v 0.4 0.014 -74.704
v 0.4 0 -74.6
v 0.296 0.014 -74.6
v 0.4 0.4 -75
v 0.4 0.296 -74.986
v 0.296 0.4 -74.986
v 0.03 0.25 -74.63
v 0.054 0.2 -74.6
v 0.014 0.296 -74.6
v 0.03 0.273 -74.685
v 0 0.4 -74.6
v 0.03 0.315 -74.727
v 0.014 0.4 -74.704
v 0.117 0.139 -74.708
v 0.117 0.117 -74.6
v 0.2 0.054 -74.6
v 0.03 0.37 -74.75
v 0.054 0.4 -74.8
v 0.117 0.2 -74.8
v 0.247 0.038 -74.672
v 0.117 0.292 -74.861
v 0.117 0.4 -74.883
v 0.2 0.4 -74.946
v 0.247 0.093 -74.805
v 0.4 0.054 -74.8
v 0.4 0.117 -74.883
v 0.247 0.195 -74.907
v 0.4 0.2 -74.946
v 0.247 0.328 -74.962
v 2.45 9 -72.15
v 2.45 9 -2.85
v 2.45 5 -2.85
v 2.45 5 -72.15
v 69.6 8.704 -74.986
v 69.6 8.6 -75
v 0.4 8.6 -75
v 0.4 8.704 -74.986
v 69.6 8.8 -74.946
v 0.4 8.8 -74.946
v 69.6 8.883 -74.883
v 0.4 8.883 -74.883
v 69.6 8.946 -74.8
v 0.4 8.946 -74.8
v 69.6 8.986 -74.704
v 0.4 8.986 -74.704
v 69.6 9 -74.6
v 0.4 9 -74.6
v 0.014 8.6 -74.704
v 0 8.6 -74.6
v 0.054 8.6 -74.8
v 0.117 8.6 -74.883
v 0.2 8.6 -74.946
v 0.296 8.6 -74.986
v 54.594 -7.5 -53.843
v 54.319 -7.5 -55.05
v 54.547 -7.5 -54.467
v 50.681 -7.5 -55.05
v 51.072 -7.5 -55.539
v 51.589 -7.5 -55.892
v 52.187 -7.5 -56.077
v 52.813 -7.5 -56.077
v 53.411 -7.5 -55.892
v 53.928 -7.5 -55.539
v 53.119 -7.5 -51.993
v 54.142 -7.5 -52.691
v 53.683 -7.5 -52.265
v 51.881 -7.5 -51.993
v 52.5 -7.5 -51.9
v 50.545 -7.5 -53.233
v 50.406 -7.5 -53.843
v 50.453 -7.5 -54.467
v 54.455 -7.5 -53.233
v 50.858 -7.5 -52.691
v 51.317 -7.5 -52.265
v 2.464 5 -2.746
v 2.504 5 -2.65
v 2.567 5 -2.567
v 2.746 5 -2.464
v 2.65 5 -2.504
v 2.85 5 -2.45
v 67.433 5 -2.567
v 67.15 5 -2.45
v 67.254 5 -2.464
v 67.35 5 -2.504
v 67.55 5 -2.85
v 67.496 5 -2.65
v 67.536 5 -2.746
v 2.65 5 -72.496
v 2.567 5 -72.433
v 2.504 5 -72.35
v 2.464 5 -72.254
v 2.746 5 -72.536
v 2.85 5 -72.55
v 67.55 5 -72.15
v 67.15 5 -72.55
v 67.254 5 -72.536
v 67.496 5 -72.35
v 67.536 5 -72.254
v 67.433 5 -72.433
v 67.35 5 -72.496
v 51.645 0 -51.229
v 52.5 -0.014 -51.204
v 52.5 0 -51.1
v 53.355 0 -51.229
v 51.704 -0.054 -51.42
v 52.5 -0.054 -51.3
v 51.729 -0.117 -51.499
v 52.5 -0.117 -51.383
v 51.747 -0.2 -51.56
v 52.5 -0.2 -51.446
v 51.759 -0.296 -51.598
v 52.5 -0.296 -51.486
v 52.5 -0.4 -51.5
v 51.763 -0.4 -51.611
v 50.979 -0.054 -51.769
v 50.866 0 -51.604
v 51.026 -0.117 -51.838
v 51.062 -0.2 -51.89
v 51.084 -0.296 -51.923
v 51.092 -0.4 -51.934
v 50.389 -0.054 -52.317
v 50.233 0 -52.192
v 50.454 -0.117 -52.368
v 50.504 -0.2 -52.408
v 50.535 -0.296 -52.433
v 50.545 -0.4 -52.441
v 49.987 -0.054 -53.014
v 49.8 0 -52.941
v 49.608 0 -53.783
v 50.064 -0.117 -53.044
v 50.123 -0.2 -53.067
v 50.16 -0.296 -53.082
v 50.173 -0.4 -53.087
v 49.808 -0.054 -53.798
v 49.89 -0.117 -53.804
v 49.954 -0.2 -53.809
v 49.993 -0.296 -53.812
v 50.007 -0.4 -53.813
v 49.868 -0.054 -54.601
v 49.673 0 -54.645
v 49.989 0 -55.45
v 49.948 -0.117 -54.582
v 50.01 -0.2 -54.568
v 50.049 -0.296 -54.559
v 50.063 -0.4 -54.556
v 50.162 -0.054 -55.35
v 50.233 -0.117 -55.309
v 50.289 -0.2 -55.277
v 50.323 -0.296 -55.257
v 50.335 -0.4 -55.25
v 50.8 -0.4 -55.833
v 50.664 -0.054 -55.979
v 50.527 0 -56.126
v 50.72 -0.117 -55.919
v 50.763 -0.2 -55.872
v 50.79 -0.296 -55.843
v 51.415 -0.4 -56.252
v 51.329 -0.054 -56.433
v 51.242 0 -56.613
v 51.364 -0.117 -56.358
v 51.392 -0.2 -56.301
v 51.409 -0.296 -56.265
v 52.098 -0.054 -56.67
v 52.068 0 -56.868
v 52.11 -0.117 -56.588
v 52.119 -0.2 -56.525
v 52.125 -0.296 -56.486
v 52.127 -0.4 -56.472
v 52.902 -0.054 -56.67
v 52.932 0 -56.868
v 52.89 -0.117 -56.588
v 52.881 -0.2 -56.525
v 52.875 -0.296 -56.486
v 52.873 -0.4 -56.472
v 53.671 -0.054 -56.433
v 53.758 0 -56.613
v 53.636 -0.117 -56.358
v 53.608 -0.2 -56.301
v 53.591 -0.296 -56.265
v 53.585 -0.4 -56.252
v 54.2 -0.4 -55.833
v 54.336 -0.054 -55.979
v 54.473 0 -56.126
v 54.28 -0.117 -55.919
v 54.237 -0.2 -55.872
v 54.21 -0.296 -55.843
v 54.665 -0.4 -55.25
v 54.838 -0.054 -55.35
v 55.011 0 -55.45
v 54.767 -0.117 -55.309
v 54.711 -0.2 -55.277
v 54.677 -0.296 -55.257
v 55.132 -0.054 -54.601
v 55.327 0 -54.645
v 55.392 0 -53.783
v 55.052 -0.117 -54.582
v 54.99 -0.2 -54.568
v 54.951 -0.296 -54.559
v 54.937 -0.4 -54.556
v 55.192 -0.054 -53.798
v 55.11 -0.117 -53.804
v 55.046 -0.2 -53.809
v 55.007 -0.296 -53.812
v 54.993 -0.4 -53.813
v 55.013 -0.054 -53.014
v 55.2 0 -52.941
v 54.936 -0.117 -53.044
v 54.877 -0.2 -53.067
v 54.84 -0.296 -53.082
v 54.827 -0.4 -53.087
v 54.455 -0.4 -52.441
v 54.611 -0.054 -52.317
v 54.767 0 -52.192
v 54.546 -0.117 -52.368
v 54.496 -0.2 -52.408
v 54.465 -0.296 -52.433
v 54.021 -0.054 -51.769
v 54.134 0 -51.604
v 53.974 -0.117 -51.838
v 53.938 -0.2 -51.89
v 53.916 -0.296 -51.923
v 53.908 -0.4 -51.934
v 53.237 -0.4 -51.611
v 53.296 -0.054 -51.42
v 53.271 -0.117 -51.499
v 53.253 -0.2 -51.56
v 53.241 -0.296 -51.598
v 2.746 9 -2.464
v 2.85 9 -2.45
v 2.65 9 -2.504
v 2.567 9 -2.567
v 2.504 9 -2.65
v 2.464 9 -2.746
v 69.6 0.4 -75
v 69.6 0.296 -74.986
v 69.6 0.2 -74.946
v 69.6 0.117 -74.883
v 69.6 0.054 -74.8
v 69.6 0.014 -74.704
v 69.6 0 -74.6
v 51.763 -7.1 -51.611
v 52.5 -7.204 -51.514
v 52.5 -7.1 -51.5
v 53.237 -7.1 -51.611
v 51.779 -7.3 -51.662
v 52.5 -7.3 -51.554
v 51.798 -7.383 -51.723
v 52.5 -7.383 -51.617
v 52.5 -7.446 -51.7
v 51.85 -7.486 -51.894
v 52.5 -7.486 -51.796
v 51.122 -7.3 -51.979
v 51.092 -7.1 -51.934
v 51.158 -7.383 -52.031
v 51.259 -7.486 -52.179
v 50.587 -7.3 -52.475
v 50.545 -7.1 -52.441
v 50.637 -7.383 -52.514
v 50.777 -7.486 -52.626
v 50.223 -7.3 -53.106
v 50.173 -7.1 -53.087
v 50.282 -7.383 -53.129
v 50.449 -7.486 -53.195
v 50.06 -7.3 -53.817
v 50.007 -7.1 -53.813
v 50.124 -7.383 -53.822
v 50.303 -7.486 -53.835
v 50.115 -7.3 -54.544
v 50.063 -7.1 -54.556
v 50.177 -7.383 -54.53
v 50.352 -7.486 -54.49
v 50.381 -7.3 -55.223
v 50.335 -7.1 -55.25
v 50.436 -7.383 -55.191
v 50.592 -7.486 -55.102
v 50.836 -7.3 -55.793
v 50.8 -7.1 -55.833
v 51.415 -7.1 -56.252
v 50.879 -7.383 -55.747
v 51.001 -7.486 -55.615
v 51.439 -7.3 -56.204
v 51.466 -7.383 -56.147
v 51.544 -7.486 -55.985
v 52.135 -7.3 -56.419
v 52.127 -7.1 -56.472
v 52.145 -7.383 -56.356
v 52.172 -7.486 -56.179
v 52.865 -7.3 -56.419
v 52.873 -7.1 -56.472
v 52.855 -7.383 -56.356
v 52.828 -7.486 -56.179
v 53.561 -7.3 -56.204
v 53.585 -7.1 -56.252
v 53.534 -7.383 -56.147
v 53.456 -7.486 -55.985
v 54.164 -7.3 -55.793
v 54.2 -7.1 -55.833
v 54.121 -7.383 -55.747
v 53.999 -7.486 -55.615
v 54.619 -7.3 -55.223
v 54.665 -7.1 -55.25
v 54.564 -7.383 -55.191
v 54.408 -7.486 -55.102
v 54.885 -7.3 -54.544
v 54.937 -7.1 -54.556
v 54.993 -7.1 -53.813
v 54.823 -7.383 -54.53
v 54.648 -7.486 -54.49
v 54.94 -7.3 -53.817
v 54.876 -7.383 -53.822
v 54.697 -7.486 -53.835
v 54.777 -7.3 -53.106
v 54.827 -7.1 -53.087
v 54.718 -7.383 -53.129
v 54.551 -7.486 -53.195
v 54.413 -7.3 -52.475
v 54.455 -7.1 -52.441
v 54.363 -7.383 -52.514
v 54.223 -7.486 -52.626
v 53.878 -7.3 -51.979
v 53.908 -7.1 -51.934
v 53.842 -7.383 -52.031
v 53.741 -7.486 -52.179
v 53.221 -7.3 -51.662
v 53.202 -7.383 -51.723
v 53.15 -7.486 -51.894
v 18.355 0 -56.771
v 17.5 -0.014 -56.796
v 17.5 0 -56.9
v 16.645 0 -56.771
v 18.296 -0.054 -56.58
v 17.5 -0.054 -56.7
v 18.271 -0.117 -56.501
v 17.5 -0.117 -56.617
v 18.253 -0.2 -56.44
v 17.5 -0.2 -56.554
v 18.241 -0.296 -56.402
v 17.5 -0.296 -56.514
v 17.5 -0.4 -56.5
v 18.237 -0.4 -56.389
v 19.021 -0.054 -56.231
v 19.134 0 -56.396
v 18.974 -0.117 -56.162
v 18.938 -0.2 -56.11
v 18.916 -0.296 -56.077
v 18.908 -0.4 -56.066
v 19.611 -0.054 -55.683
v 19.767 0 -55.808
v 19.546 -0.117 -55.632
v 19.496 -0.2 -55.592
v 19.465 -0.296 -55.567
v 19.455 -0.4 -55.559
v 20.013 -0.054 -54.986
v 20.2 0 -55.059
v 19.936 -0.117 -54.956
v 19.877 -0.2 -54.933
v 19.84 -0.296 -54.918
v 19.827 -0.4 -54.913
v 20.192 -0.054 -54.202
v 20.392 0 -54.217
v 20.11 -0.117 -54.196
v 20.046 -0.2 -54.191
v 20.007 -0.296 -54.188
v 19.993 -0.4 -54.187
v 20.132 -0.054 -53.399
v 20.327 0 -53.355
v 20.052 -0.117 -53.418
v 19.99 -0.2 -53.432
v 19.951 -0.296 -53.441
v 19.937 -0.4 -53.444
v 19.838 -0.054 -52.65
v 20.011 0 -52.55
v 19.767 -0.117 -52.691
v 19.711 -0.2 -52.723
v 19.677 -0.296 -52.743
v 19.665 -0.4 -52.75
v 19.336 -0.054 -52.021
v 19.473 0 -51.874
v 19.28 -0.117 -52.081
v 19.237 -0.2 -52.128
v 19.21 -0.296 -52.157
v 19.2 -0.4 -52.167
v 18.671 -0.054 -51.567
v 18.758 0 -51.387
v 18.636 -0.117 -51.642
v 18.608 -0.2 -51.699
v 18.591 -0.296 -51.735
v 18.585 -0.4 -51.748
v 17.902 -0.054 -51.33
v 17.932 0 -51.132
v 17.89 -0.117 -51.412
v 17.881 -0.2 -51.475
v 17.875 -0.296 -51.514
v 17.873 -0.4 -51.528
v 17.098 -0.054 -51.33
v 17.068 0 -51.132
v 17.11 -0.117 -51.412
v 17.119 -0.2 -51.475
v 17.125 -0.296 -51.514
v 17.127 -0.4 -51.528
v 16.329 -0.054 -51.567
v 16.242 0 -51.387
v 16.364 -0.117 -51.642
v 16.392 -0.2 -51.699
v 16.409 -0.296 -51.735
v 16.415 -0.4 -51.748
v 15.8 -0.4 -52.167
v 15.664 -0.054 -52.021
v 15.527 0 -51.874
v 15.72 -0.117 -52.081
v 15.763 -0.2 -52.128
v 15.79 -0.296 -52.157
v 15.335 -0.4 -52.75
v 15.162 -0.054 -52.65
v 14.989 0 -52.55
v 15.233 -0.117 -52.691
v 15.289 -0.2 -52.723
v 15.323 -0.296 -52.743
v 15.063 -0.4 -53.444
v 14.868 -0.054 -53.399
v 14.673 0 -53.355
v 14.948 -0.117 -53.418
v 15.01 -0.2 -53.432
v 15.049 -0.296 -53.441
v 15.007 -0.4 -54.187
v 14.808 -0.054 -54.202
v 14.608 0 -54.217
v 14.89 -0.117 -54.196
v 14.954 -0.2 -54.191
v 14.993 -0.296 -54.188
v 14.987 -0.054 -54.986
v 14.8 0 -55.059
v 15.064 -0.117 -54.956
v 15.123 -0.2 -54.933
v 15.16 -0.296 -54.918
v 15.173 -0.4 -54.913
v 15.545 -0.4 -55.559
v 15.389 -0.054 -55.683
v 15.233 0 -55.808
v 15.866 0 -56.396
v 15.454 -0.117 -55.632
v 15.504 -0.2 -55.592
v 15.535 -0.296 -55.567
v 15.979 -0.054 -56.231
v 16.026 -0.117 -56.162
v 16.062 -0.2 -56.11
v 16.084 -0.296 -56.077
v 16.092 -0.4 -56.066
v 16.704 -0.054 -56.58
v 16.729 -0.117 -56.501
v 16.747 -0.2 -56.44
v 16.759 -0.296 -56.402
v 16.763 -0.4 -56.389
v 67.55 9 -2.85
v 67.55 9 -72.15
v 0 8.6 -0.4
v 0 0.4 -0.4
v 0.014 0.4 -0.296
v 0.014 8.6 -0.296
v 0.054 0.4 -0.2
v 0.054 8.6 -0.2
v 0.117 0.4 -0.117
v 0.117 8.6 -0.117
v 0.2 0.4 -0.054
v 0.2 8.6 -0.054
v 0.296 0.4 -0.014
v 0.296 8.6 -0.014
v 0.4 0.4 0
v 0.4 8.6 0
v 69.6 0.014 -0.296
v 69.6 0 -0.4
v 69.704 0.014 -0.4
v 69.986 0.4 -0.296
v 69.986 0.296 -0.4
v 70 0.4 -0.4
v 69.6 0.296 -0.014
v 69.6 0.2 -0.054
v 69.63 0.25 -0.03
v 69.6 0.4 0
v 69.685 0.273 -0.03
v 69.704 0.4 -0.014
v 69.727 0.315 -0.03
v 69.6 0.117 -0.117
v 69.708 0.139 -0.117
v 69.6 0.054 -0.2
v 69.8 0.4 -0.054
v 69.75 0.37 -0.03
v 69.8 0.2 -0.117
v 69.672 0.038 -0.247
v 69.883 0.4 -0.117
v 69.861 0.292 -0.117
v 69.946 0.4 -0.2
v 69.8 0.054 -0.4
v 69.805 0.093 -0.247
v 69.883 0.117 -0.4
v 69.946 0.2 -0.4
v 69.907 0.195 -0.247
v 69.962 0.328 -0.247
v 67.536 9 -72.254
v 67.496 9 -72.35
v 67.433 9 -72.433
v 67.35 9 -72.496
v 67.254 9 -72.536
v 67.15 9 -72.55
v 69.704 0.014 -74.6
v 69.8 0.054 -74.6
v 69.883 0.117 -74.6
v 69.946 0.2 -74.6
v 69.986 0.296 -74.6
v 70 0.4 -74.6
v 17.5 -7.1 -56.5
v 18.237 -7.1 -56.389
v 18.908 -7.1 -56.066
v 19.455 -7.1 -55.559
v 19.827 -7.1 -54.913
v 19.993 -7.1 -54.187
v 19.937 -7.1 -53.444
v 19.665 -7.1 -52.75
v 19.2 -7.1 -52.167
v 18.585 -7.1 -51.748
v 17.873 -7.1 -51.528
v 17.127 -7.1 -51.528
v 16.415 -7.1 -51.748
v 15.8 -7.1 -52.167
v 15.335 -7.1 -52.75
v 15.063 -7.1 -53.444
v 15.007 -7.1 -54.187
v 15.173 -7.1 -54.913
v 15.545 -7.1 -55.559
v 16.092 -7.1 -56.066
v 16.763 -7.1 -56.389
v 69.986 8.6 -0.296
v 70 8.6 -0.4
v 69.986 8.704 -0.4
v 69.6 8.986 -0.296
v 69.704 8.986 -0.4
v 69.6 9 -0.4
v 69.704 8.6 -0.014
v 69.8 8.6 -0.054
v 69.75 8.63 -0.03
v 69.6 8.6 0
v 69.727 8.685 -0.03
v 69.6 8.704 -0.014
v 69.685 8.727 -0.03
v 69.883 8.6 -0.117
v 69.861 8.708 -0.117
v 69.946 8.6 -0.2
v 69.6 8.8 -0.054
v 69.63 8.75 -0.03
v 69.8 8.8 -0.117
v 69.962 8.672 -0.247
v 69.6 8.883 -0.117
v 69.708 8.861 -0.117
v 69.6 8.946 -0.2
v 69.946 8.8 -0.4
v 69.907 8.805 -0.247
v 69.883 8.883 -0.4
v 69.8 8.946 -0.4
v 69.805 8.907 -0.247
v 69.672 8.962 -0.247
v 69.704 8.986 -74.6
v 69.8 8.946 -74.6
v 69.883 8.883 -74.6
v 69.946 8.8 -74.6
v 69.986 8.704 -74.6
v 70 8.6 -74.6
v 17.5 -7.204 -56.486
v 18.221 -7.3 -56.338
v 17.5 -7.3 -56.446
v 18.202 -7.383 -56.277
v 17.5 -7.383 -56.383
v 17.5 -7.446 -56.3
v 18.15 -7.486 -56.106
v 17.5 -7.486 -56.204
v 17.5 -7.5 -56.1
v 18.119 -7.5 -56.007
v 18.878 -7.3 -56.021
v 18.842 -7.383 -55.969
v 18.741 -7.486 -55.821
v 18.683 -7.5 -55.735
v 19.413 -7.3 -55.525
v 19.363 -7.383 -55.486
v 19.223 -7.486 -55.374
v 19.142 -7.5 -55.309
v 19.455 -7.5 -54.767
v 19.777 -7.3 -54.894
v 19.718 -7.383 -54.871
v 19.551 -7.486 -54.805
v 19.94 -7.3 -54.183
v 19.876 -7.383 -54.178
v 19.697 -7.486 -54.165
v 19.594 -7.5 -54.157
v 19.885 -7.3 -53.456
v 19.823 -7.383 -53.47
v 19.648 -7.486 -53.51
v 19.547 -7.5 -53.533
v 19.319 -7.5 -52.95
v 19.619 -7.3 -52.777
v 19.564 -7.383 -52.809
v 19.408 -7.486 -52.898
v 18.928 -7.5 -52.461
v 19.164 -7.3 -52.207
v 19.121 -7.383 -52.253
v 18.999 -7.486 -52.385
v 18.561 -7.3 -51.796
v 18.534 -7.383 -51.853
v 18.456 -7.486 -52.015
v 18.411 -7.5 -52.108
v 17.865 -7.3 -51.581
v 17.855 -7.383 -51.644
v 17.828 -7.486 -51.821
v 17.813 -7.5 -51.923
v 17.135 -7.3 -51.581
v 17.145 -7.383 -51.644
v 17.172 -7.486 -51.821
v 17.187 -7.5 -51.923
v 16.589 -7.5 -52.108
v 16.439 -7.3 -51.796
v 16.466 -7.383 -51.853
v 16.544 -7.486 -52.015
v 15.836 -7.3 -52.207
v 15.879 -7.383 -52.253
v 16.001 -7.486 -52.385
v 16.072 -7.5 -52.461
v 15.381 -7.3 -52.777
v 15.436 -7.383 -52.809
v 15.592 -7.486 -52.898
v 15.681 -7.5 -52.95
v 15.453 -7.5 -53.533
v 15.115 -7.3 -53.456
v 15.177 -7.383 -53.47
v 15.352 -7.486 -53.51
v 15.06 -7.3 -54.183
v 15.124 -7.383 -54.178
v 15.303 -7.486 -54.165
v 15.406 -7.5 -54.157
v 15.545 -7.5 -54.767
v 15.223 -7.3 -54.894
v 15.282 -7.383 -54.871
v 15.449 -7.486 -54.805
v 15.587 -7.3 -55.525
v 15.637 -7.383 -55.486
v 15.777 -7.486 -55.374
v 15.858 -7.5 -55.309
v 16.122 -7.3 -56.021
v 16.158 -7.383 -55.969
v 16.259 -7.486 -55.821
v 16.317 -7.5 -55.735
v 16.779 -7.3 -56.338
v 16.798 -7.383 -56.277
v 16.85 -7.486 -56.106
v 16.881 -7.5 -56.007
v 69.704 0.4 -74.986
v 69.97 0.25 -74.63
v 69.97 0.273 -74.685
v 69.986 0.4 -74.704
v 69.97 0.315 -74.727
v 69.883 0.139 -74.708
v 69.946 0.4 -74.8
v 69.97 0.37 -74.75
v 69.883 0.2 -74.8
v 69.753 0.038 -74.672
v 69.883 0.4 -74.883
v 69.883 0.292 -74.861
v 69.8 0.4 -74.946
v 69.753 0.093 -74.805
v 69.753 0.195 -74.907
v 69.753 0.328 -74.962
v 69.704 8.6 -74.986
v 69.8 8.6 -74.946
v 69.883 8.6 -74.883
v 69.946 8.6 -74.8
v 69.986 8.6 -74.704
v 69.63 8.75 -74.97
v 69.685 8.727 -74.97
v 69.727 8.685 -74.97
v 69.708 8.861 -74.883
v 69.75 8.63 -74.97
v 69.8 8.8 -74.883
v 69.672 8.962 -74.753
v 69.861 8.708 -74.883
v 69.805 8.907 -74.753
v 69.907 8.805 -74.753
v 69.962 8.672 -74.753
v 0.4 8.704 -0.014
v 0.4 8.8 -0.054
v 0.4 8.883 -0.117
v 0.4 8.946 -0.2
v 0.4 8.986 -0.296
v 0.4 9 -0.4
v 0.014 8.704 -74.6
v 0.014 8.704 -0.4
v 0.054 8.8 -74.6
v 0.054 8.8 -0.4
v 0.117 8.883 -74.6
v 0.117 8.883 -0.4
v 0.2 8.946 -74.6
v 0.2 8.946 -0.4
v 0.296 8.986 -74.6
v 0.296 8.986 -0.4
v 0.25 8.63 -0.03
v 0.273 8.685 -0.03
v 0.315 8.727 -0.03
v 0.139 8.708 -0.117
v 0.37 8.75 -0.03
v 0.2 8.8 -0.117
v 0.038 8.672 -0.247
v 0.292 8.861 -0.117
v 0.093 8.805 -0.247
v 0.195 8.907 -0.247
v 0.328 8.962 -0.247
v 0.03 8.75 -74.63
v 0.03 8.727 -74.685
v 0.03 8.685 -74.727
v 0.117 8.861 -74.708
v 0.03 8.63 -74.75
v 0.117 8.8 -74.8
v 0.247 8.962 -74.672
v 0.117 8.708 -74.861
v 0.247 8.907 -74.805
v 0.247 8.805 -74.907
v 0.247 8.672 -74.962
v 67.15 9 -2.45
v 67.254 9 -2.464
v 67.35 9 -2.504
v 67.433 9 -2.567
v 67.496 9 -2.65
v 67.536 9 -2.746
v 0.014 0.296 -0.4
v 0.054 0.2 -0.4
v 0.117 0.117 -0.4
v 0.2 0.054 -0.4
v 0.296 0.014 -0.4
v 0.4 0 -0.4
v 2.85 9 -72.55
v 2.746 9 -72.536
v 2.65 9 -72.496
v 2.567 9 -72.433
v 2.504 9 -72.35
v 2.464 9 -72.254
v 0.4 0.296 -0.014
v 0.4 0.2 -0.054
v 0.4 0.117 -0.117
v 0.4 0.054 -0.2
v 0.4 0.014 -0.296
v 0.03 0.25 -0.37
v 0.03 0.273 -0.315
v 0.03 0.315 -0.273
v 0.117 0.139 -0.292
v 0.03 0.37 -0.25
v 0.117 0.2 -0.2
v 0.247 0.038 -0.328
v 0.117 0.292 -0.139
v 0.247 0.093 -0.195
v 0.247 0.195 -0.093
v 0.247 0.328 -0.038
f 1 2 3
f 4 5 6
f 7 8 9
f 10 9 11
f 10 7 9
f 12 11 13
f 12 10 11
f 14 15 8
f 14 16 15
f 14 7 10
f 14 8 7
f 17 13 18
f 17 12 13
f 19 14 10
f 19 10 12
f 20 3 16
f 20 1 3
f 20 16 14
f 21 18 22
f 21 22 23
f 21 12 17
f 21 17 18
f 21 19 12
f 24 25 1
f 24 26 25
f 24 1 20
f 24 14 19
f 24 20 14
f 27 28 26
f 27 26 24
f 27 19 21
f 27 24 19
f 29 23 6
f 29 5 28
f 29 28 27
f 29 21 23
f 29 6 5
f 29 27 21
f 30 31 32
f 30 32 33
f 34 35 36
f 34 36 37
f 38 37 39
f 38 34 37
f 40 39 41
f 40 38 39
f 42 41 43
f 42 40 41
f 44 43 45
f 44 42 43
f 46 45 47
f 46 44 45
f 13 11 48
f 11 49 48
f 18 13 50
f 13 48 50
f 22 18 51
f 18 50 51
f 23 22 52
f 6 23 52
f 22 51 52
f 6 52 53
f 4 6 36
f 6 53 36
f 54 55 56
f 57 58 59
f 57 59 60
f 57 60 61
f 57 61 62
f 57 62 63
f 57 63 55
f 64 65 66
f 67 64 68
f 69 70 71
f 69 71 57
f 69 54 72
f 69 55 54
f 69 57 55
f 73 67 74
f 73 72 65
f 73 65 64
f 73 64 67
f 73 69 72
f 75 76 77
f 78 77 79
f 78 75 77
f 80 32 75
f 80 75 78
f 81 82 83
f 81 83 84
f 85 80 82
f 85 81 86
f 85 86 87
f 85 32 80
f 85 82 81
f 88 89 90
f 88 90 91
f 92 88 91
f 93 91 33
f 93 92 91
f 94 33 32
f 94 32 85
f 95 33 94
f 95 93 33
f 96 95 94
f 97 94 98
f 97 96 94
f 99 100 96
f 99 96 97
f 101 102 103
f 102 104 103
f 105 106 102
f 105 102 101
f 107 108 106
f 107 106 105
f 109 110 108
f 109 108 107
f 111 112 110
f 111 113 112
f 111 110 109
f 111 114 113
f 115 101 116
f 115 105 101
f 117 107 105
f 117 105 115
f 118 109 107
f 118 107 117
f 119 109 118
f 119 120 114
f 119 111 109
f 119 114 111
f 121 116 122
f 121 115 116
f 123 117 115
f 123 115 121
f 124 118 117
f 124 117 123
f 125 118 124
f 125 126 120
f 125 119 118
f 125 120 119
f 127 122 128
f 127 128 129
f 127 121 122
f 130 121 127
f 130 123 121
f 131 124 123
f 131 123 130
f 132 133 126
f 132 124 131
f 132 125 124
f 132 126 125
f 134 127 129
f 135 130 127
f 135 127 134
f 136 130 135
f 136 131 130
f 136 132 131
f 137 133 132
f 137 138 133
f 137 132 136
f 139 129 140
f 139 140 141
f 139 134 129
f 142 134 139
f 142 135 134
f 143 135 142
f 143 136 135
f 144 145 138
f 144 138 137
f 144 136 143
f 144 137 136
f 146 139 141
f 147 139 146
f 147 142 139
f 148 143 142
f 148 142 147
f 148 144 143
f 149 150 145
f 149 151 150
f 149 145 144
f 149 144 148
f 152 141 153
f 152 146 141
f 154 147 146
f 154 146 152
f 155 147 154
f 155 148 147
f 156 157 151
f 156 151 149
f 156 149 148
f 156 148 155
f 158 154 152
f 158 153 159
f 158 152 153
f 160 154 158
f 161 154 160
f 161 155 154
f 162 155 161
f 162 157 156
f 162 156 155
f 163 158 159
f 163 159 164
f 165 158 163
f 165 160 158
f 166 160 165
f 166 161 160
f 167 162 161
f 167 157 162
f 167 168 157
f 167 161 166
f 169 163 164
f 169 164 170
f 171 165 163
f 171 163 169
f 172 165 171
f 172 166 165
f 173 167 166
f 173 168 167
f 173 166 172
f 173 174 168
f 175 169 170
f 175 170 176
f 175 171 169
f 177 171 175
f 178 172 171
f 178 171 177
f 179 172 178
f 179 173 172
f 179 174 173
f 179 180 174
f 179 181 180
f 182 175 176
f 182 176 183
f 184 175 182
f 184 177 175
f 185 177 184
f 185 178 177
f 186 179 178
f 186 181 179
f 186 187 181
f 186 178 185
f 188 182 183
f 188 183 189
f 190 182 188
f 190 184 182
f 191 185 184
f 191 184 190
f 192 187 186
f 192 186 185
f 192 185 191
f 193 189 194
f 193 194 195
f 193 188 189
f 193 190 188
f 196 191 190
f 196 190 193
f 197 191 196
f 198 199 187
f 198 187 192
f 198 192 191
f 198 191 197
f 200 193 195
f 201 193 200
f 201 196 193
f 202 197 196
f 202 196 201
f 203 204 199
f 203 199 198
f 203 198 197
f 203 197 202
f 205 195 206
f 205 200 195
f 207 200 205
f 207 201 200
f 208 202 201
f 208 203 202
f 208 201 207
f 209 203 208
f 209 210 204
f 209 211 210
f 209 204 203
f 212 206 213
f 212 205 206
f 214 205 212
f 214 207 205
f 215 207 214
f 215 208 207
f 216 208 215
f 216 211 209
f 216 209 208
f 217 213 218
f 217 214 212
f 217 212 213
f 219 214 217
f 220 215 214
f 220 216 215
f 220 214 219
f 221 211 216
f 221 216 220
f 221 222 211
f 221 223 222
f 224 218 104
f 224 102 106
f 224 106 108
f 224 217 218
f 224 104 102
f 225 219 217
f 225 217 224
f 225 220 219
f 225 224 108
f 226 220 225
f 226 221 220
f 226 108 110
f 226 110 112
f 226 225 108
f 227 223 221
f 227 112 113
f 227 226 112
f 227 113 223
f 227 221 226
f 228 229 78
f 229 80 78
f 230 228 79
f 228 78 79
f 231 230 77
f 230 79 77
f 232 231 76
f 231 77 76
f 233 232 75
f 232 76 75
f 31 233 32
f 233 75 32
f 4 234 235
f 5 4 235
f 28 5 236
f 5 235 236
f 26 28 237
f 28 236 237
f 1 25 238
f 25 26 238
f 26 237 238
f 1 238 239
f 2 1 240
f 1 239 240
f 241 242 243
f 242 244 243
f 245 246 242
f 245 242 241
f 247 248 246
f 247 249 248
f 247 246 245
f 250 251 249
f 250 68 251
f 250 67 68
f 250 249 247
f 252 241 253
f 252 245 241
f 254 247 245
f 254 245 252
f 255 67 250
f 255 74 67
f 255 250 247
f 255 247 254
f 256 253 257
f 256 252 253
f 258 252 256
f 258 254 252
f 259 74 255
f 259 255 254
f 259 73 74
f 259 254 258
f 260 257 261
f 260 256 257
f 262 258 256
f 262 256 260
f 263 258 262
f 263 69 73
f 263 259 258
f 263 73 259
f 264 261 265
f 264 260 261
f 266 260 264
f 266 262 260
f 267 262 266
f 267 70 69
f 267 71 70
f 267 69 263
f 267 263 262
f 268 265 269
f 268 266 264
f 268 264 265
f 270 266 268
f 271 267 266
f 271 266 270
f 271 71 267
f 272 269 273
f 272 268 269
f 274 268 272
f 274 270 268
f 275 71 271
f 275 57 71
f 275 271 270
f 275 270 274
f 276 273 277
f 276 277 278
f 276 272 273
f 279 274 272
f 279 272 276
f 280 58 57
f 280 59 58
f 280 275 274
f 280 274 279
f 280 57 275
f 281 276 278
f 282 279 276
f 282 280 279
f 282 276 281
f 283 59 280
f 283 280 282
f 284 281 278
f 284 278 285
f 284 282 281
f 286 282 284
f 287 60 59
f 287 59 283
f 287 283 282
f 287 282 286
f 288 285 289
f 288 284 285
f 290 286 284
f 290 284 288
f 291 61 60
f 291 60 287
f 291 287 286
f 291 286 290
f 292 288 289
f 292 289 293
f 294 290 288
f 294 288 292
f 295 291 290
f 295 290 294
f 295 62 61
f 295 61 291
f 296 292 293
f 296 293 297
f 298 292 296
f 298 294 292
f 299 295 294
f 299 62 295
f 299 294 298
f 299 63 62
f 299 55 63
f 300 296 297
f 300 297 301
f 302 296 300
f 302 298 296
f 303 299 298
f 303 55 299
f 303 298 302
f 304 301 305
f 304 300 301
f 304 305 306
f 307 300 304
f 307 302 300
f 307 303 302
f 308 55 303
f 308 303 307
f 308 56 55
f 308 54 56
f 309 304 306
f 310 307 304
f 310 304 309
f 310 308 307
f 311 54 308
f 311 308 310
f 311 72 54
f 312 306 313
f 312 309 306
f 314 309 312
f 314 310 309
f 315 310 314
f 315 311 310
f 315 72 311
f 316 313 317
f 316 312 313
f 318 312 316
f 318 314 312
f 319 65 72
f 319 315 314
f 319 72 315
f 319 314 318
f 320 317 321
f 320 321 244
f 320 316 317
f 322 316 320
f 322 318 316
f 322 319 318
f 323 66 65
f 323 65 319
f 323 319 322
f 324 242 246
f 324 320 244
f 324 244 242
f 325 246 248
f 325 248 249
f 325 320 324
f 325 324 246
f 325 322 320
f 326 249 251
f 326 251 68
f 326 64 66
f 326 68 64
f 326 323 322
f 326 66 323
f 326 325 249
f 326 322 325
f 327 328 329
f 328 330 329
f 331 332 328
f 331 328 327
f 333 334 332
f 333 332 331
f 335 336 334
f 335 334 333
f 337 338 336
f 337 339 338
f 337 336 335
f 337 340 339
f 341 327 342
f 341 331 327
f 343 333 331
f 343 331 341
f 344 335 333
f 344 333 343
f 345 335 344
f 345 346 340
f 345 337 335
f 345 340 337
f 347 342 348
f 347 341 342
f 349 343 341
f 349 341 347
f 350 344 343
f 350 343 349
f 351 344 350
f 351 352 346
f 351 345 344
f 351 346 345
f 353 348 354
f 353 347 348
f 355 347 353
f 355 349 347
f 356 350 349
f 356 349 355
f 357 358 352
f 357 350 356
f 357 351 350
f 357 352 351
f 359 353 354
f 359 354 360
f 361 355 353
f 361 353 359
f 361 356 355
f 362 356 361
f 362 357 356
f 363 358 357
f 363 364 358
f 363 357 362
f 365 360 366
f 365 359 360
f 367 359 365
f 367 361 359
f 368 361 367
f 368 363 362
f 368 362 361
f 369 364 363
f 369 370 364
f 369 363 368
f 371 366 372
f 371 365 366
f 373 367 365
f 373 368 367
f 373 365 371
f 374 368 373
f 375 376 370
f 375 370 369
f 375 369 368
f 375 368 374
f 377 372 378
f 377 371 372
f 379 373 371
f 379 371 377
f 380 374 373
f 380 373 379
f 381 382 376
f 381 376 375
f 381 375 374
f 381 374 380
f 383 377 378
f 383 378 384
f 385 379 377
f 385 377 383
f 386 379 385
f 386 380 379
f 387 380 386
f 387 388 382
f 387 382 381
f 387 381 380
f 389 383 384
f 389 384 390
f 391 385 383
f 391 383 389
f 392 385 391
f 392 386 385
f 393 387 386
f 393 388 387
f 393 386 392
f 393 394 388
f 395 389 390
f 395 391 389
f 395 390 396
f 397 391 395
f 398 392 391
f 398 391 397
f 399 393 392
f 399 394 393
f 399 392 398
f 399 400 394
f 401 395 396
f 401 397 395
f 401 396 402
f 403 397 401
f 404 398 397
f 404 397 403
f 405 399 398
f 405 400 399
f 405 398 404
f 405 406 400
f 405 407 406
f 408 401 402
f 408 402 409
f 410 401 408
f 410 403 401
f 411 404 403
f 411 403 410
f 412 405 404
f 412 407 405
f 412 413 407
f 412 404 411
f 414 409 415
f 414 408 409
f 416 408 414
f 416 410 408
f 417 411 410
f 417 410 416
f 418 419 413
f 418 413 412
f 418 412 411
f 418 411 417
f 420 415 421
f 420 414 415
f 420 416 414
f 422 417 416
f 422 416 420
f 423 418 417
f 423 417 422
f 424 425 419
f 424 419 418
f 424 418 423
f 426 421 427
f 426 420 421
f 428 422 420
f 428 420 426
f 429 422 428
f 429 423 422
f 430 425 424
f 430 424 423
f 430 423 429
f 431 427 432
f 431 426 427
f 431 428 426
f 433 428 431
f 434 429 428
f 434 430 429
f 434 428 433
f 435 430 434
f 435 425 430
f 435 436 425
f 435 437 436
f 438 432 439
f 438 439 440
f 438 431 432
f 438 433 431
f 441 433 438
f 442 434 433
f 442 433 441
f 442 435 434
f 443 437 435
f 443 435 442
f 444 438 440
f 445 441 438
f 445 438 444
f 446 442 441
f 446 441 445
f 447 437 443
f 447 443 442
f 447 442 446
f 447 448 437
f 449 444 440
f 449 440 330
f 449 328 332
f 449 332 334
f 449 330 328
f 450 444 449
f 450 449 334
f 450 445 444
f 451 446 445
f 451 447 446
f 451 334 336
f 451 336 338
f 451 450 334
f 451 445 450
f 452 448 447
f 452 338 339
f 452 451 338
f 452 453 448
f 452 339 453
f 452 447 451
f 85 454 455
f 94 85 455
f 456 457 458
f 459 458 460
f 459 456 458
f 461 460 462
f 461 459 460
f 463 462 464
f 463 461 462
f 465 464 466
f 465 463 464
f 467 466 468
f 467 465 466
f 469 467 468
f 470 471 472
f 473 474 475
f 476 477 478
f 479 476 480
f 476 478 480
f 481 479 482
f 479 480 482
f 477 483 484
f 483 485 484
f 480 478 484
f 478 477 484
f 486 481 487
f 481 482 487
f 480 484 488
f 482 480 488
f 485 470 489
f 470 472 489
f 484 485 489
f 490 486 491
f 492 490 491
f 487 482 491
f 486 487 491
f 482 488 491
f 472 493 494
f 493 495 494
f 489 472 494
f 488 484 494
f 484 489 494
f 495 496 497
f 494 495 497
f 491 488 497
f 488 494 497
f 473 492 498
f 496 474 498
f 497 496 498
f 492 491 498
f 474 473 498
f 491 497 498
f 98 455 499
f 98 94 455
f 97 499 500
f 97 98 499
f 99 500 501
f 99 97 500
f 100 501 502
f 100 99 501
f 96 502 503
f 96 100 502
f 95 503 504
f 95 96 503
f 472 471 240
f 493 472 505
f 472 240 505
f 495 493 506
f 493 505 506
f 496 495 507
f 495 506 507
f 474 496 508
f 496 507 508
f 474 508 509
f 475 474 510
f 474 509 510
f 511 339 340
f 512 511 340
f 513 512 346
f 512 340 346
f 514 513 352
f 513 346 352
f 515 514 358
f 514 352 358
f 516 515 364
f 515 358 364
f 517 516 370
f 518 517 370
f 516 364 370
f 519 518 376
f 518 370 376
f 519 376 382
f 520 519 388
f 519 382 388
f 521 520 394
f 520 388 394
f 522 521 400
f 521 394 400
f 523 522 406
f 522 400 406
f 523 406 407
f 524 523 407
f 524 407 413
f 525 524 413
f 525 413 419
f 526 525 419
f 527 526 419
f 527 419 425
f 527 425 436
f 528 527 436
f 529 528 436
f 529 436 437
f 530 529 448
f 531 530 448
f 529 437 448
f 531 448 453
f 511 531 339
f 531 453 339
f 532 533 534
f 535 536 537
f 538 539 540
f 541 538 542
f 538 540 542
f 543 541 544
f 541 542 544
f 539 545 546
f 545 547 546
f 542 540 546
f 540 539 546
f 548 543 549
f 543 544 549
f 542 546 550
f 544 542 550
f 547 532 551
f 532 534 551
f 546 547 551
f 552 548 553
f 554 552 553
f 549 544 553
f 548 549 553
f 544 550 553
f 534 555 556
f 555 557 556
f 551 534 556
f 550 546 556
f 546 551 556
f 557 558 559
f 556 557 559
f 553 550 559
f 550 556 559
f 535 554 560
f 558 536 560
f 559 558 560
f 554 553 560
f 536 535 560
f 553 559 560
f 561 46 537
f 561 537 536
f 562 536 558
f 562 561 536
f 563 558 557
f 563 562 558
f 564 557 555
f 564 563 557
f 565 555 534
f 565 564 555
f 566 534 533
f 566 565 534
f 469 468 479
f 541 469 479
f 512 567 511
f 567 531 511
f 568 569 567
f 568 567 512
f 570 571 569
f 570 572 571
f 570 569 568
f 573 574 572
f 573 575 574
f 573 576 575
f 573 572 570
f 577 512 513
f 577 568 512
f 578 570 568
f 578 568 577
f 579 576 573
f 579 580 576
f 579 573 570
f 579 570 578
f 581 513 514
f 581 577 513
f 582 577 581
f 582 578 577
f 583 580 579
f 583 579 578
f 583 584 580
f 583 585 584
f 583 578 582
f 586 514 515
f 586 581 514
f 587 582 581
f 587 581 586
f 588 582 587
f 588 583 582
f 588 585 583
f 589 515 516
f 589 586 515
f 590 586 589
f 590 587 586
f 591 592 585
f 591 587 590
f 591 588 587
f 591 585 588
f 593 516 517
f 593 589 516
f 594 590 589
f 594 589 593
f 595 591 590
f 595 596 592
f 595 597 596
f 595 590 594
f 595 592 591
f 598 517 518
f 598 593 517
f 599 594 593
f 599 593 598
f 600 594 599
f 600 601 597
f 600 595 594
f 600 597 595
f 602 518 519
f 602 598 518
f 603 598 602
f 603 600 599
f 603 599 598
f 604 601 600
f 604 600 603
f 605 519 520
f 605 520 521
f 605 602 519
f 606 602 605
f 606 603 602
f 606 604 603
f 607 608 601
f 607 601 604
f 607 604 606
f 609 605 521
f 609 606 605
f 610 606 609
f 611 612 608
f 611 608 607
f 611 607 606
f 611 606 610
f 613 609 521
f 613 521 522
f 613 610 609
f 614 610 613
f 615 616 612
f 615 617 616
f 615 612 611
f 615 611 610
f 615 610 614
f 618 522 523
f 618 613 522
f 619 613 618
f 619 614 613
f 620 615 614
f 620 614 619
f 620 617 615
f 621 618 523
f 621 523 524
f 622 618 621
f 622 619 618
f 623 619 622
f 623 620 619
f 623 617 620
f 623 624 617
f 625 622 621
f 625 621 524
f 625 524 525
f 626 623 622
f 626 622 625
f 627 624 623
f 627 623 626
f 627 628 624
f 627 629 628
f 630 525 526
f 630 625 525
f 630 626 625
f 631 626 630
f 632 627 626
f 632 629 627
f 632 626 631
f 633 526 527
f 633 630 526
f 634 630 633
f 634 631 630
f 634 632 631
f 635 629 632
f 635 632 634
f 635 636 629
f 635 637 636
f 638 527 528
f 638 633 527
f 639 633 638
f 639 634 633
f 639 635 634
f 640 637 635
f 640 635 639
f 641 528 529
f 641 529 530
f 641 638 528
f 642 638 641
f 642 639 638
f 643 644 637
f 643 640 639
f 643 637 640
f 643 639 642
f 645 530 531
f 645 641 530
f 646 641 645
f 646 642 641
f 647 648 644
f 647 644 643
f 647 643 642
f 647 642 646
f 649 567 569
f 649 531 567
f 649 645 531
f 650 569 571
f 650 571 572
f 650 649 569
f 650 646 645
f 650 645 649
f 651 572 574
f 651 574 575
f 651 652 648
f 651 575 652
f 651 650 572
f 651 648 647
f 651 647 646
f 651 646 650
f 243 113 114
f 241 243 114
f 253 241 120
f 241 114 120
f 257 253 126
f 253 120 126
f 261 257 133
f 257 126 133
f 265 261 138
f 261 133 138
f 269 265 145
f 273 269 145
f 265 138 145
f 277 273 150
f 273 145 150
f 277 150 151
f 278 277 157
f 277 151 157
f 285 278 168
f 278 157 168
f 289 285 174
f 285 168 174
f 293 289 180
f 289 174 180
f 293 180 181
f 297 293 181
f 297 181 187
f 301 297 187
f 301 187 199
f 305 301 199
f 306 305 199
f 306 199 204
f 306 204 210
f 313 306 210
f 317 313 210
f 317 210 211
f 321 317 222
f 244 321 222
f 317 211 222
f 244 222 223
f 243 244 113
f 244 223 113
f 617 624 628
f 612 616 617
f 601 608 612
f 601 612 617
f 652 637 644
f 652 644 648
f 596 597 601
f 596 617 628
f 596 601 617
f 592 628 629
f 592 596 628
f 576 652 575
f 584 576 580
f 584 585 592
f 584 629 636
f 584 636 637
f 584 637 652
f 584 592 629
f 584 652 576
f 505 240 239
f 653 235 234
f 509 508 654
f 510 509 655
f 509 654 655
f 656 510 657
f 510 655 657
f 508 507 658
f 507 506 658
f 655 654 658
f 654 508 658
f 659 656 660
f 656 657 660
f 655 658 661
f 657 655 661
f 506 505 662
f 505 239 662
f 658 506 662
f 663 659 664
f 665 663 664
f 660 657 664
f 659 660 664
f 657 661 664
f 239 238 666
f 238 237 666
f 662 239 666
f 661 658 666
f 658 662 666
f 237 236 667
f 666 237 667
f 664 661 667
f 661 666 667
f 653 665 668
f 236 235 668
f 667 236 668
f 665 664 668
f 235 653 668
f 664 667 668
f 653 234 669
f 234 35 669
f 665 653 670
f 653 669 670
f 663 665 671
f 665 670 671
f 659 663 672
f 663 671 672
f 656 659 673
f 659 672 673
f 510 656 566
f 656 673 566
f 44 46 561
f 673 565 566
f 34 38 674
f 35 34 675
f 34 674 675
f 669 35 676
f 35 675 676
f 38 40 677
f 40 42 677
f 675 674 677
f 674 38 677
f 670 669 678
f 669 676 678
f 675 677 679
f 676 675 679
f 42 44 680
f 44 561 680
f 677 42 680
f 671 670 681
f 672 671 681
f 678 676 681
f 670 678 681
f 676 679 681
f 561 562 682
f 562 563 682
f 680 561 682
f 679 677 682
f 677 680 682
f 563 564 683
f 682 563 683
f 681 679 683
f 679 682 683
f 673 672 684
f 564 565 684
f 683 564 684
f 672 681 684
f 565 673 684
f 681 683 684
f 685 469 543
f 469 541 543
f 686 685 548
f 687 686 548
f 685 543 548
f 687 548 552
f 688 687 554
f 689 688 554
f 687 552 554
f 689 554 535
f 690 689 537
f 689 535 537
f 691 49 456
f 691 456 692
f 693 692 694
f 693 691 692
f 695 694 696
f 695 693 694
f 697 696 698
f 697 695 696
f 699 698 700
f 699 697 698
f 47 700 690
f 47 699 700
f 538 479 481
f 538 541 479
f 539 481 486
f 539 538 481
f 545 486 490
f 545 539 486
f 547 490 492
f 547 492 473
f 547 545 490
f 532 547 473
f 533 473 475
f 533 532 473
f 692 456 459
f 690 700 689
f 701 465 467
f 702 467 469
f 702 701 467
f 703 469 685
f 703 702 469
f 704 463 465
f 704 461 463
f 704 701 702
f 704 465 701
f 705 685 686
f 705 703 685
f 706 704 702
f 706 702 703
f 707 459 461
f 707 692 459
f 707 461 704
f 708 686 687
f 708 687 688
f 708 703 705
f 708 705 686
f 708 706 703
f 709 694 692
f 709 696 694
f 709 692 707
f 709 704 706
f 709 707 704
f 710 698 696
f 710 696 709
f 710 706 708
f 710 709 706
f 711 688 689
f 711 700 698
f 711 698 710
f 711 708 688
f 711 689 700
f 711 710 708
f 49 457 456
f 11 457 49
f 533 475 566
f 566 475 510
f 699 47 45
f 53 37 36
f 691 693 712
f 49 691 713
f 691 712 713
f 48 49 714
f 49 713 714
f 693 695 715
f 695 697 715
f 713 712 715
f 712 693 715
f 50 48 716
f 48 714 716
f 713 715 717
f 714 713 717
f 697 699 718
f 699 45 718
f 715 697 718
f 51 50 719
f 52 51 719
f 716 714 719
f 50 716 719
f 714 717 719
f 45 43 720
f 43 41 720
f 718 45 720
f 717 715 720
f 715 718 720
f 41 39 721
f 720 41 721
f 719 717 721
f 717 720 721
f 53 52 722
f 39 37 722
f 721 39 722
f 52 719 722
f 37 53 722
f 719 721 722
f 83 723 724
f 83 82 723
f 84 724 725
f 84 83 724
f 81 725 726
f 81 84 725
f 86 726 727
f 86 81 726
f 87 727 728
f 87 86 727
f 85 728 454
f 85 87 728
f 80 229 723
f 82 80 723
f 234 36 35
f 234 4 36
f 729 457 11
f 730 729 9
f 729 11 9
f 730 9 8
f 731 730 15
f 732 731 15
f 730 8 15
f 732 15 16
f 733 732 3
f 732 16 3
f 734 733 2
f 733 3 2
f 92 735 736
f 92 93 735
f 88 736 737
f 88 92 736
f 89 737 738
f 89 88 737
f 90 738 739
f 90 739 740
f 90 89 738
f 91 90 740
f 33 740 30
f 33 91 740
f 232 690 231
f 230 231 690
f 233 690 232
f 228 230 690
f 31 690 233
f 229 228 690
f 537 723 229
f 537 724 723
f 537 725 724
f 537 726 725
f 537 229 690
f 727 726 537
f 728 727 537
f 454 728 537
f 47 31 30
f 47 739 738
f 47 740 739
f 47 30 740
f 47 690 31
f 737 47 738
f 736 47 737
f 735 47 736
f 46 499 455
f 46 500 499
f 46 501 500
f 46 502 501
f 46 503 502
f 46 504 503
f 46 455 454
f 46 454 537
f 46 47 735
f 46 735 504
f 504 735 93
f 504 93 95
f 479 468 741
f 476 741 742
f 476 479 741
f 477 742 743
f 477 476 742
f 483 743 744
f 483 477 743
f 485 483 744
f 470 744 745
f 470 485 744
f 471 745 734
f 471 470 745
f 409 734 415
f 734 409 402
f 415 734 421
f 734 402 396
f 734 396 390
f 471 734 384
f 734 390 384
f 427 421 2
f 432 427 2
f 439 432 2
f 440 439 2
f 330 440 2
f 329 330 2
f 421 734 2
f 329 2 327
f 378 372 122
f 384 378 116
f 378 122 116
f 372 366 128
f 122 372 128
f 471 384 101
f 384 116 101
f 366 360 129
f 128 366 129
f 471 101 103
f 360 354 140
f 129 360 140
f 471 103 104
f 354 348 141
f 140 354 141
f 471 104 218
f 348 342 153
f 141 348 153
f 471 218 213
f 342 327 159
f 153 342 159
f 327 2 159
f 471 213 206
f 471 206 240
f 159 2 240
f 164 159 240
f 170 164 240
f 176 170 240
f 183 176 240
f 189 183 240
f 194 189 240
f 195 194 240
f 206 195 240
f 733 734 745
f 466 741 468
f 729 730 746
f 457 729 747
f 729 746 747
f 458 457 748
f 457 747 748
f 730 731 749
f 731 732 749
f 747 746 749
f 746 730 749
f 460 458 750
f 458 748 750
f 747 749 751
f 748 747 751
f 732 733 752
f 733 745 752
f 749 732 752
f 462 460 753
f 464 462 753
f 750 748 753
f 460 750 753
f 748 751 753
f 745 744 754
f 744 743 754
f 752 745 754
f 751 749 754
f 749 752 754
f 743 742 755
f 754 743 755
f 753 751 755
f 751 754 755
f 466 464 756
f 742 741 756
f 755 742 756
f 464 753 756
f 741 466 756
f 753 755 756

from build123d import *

# Parameters (mm, degrees)
SKETCH1_W           = 70
SKETCH1_H           = 75
BOSS_EXTRUDE1_DEPTH = 9
SKETCH2_W           = 65.1
SKETCH2_H           = 70.1
CUT_EXTRUDE1_DEPTH  = 4
SKETCH4_R           = 2.5
BOSS_EXTRUDE3_DEPTH = 7.5
FILLET1_R           = 0.4


with BuildPart() as part:
    # Sketch1 → Boss-Extrude1 (new body)
    with BuildSketch(Plane(origin=(0, 0, 0), x_dir=(1, 0, 0), z_dir=(0, 1, 0))):
        with Locations((35, 37.5)):
            Rectangle(SKETCH1_W, SKETCH1_H)
    extrude(amount=BOSS_EXTRUDE1_DEPTH)

    # Sketch2 → Cut-Extrude1 (cut)
    with BuildSketch(Plane(origin=(0, 9, 0), x_dir=(1, 0, 0), z_dir=(0, 1, 0))):
        with Locations((35, 37.5)):
            Rectangle(SKETCH2_W, SKETCH2_H)
    extrude(amount=-CUT_EXTRUDE1_DEPTH, mode=Mode.SUBTRACT)

    # Sketch4 → Boss-Extrude3 (add)
    with BuildSketch(Plane.XZ):
        with Locations(Location((17.5, -54, 0), (0, 0, 270))):
            Circle(SKETCH4_R)
        with Locations(Location((52.5, -54, 0), (0, 0, 90))):
            Circle(SKETCH4_R)
    extrude(amount=BOSS_EXTRUDE3_DEPTH)

    # Fillet1
    fillet1_edges = [part.edges().sort_by_distance(p)[0] for p in [
        (70, 9, -37.5),
        (35, 9, -75),
        (2.45, 7, -72.55),
        (2.45, 7, -2.45),
        (67.55, 7, -2.45),
        (67.55, 7, -72.55),
        (17.5, 0, -51.5),
        (17.5, -7.5, -51.5),
        (52.5, 0, -56.5),
        (52.5, -7.5, -56.5),
        (0, 9, -37.5),
        (35, 0, -75),
        (70, 0, -37.5),
        (35, 0, 0),
        (0, 0, -37.5),
        (0, 4.5, -75),
        (70, 4.5, -75),
        (70, 4.5, 0),
        (0, 4.5, 0),
        (35, 9, 0),
    ]]
    fillet(fillet1_edges, radius=FILLET1_R)


solid = part.part
